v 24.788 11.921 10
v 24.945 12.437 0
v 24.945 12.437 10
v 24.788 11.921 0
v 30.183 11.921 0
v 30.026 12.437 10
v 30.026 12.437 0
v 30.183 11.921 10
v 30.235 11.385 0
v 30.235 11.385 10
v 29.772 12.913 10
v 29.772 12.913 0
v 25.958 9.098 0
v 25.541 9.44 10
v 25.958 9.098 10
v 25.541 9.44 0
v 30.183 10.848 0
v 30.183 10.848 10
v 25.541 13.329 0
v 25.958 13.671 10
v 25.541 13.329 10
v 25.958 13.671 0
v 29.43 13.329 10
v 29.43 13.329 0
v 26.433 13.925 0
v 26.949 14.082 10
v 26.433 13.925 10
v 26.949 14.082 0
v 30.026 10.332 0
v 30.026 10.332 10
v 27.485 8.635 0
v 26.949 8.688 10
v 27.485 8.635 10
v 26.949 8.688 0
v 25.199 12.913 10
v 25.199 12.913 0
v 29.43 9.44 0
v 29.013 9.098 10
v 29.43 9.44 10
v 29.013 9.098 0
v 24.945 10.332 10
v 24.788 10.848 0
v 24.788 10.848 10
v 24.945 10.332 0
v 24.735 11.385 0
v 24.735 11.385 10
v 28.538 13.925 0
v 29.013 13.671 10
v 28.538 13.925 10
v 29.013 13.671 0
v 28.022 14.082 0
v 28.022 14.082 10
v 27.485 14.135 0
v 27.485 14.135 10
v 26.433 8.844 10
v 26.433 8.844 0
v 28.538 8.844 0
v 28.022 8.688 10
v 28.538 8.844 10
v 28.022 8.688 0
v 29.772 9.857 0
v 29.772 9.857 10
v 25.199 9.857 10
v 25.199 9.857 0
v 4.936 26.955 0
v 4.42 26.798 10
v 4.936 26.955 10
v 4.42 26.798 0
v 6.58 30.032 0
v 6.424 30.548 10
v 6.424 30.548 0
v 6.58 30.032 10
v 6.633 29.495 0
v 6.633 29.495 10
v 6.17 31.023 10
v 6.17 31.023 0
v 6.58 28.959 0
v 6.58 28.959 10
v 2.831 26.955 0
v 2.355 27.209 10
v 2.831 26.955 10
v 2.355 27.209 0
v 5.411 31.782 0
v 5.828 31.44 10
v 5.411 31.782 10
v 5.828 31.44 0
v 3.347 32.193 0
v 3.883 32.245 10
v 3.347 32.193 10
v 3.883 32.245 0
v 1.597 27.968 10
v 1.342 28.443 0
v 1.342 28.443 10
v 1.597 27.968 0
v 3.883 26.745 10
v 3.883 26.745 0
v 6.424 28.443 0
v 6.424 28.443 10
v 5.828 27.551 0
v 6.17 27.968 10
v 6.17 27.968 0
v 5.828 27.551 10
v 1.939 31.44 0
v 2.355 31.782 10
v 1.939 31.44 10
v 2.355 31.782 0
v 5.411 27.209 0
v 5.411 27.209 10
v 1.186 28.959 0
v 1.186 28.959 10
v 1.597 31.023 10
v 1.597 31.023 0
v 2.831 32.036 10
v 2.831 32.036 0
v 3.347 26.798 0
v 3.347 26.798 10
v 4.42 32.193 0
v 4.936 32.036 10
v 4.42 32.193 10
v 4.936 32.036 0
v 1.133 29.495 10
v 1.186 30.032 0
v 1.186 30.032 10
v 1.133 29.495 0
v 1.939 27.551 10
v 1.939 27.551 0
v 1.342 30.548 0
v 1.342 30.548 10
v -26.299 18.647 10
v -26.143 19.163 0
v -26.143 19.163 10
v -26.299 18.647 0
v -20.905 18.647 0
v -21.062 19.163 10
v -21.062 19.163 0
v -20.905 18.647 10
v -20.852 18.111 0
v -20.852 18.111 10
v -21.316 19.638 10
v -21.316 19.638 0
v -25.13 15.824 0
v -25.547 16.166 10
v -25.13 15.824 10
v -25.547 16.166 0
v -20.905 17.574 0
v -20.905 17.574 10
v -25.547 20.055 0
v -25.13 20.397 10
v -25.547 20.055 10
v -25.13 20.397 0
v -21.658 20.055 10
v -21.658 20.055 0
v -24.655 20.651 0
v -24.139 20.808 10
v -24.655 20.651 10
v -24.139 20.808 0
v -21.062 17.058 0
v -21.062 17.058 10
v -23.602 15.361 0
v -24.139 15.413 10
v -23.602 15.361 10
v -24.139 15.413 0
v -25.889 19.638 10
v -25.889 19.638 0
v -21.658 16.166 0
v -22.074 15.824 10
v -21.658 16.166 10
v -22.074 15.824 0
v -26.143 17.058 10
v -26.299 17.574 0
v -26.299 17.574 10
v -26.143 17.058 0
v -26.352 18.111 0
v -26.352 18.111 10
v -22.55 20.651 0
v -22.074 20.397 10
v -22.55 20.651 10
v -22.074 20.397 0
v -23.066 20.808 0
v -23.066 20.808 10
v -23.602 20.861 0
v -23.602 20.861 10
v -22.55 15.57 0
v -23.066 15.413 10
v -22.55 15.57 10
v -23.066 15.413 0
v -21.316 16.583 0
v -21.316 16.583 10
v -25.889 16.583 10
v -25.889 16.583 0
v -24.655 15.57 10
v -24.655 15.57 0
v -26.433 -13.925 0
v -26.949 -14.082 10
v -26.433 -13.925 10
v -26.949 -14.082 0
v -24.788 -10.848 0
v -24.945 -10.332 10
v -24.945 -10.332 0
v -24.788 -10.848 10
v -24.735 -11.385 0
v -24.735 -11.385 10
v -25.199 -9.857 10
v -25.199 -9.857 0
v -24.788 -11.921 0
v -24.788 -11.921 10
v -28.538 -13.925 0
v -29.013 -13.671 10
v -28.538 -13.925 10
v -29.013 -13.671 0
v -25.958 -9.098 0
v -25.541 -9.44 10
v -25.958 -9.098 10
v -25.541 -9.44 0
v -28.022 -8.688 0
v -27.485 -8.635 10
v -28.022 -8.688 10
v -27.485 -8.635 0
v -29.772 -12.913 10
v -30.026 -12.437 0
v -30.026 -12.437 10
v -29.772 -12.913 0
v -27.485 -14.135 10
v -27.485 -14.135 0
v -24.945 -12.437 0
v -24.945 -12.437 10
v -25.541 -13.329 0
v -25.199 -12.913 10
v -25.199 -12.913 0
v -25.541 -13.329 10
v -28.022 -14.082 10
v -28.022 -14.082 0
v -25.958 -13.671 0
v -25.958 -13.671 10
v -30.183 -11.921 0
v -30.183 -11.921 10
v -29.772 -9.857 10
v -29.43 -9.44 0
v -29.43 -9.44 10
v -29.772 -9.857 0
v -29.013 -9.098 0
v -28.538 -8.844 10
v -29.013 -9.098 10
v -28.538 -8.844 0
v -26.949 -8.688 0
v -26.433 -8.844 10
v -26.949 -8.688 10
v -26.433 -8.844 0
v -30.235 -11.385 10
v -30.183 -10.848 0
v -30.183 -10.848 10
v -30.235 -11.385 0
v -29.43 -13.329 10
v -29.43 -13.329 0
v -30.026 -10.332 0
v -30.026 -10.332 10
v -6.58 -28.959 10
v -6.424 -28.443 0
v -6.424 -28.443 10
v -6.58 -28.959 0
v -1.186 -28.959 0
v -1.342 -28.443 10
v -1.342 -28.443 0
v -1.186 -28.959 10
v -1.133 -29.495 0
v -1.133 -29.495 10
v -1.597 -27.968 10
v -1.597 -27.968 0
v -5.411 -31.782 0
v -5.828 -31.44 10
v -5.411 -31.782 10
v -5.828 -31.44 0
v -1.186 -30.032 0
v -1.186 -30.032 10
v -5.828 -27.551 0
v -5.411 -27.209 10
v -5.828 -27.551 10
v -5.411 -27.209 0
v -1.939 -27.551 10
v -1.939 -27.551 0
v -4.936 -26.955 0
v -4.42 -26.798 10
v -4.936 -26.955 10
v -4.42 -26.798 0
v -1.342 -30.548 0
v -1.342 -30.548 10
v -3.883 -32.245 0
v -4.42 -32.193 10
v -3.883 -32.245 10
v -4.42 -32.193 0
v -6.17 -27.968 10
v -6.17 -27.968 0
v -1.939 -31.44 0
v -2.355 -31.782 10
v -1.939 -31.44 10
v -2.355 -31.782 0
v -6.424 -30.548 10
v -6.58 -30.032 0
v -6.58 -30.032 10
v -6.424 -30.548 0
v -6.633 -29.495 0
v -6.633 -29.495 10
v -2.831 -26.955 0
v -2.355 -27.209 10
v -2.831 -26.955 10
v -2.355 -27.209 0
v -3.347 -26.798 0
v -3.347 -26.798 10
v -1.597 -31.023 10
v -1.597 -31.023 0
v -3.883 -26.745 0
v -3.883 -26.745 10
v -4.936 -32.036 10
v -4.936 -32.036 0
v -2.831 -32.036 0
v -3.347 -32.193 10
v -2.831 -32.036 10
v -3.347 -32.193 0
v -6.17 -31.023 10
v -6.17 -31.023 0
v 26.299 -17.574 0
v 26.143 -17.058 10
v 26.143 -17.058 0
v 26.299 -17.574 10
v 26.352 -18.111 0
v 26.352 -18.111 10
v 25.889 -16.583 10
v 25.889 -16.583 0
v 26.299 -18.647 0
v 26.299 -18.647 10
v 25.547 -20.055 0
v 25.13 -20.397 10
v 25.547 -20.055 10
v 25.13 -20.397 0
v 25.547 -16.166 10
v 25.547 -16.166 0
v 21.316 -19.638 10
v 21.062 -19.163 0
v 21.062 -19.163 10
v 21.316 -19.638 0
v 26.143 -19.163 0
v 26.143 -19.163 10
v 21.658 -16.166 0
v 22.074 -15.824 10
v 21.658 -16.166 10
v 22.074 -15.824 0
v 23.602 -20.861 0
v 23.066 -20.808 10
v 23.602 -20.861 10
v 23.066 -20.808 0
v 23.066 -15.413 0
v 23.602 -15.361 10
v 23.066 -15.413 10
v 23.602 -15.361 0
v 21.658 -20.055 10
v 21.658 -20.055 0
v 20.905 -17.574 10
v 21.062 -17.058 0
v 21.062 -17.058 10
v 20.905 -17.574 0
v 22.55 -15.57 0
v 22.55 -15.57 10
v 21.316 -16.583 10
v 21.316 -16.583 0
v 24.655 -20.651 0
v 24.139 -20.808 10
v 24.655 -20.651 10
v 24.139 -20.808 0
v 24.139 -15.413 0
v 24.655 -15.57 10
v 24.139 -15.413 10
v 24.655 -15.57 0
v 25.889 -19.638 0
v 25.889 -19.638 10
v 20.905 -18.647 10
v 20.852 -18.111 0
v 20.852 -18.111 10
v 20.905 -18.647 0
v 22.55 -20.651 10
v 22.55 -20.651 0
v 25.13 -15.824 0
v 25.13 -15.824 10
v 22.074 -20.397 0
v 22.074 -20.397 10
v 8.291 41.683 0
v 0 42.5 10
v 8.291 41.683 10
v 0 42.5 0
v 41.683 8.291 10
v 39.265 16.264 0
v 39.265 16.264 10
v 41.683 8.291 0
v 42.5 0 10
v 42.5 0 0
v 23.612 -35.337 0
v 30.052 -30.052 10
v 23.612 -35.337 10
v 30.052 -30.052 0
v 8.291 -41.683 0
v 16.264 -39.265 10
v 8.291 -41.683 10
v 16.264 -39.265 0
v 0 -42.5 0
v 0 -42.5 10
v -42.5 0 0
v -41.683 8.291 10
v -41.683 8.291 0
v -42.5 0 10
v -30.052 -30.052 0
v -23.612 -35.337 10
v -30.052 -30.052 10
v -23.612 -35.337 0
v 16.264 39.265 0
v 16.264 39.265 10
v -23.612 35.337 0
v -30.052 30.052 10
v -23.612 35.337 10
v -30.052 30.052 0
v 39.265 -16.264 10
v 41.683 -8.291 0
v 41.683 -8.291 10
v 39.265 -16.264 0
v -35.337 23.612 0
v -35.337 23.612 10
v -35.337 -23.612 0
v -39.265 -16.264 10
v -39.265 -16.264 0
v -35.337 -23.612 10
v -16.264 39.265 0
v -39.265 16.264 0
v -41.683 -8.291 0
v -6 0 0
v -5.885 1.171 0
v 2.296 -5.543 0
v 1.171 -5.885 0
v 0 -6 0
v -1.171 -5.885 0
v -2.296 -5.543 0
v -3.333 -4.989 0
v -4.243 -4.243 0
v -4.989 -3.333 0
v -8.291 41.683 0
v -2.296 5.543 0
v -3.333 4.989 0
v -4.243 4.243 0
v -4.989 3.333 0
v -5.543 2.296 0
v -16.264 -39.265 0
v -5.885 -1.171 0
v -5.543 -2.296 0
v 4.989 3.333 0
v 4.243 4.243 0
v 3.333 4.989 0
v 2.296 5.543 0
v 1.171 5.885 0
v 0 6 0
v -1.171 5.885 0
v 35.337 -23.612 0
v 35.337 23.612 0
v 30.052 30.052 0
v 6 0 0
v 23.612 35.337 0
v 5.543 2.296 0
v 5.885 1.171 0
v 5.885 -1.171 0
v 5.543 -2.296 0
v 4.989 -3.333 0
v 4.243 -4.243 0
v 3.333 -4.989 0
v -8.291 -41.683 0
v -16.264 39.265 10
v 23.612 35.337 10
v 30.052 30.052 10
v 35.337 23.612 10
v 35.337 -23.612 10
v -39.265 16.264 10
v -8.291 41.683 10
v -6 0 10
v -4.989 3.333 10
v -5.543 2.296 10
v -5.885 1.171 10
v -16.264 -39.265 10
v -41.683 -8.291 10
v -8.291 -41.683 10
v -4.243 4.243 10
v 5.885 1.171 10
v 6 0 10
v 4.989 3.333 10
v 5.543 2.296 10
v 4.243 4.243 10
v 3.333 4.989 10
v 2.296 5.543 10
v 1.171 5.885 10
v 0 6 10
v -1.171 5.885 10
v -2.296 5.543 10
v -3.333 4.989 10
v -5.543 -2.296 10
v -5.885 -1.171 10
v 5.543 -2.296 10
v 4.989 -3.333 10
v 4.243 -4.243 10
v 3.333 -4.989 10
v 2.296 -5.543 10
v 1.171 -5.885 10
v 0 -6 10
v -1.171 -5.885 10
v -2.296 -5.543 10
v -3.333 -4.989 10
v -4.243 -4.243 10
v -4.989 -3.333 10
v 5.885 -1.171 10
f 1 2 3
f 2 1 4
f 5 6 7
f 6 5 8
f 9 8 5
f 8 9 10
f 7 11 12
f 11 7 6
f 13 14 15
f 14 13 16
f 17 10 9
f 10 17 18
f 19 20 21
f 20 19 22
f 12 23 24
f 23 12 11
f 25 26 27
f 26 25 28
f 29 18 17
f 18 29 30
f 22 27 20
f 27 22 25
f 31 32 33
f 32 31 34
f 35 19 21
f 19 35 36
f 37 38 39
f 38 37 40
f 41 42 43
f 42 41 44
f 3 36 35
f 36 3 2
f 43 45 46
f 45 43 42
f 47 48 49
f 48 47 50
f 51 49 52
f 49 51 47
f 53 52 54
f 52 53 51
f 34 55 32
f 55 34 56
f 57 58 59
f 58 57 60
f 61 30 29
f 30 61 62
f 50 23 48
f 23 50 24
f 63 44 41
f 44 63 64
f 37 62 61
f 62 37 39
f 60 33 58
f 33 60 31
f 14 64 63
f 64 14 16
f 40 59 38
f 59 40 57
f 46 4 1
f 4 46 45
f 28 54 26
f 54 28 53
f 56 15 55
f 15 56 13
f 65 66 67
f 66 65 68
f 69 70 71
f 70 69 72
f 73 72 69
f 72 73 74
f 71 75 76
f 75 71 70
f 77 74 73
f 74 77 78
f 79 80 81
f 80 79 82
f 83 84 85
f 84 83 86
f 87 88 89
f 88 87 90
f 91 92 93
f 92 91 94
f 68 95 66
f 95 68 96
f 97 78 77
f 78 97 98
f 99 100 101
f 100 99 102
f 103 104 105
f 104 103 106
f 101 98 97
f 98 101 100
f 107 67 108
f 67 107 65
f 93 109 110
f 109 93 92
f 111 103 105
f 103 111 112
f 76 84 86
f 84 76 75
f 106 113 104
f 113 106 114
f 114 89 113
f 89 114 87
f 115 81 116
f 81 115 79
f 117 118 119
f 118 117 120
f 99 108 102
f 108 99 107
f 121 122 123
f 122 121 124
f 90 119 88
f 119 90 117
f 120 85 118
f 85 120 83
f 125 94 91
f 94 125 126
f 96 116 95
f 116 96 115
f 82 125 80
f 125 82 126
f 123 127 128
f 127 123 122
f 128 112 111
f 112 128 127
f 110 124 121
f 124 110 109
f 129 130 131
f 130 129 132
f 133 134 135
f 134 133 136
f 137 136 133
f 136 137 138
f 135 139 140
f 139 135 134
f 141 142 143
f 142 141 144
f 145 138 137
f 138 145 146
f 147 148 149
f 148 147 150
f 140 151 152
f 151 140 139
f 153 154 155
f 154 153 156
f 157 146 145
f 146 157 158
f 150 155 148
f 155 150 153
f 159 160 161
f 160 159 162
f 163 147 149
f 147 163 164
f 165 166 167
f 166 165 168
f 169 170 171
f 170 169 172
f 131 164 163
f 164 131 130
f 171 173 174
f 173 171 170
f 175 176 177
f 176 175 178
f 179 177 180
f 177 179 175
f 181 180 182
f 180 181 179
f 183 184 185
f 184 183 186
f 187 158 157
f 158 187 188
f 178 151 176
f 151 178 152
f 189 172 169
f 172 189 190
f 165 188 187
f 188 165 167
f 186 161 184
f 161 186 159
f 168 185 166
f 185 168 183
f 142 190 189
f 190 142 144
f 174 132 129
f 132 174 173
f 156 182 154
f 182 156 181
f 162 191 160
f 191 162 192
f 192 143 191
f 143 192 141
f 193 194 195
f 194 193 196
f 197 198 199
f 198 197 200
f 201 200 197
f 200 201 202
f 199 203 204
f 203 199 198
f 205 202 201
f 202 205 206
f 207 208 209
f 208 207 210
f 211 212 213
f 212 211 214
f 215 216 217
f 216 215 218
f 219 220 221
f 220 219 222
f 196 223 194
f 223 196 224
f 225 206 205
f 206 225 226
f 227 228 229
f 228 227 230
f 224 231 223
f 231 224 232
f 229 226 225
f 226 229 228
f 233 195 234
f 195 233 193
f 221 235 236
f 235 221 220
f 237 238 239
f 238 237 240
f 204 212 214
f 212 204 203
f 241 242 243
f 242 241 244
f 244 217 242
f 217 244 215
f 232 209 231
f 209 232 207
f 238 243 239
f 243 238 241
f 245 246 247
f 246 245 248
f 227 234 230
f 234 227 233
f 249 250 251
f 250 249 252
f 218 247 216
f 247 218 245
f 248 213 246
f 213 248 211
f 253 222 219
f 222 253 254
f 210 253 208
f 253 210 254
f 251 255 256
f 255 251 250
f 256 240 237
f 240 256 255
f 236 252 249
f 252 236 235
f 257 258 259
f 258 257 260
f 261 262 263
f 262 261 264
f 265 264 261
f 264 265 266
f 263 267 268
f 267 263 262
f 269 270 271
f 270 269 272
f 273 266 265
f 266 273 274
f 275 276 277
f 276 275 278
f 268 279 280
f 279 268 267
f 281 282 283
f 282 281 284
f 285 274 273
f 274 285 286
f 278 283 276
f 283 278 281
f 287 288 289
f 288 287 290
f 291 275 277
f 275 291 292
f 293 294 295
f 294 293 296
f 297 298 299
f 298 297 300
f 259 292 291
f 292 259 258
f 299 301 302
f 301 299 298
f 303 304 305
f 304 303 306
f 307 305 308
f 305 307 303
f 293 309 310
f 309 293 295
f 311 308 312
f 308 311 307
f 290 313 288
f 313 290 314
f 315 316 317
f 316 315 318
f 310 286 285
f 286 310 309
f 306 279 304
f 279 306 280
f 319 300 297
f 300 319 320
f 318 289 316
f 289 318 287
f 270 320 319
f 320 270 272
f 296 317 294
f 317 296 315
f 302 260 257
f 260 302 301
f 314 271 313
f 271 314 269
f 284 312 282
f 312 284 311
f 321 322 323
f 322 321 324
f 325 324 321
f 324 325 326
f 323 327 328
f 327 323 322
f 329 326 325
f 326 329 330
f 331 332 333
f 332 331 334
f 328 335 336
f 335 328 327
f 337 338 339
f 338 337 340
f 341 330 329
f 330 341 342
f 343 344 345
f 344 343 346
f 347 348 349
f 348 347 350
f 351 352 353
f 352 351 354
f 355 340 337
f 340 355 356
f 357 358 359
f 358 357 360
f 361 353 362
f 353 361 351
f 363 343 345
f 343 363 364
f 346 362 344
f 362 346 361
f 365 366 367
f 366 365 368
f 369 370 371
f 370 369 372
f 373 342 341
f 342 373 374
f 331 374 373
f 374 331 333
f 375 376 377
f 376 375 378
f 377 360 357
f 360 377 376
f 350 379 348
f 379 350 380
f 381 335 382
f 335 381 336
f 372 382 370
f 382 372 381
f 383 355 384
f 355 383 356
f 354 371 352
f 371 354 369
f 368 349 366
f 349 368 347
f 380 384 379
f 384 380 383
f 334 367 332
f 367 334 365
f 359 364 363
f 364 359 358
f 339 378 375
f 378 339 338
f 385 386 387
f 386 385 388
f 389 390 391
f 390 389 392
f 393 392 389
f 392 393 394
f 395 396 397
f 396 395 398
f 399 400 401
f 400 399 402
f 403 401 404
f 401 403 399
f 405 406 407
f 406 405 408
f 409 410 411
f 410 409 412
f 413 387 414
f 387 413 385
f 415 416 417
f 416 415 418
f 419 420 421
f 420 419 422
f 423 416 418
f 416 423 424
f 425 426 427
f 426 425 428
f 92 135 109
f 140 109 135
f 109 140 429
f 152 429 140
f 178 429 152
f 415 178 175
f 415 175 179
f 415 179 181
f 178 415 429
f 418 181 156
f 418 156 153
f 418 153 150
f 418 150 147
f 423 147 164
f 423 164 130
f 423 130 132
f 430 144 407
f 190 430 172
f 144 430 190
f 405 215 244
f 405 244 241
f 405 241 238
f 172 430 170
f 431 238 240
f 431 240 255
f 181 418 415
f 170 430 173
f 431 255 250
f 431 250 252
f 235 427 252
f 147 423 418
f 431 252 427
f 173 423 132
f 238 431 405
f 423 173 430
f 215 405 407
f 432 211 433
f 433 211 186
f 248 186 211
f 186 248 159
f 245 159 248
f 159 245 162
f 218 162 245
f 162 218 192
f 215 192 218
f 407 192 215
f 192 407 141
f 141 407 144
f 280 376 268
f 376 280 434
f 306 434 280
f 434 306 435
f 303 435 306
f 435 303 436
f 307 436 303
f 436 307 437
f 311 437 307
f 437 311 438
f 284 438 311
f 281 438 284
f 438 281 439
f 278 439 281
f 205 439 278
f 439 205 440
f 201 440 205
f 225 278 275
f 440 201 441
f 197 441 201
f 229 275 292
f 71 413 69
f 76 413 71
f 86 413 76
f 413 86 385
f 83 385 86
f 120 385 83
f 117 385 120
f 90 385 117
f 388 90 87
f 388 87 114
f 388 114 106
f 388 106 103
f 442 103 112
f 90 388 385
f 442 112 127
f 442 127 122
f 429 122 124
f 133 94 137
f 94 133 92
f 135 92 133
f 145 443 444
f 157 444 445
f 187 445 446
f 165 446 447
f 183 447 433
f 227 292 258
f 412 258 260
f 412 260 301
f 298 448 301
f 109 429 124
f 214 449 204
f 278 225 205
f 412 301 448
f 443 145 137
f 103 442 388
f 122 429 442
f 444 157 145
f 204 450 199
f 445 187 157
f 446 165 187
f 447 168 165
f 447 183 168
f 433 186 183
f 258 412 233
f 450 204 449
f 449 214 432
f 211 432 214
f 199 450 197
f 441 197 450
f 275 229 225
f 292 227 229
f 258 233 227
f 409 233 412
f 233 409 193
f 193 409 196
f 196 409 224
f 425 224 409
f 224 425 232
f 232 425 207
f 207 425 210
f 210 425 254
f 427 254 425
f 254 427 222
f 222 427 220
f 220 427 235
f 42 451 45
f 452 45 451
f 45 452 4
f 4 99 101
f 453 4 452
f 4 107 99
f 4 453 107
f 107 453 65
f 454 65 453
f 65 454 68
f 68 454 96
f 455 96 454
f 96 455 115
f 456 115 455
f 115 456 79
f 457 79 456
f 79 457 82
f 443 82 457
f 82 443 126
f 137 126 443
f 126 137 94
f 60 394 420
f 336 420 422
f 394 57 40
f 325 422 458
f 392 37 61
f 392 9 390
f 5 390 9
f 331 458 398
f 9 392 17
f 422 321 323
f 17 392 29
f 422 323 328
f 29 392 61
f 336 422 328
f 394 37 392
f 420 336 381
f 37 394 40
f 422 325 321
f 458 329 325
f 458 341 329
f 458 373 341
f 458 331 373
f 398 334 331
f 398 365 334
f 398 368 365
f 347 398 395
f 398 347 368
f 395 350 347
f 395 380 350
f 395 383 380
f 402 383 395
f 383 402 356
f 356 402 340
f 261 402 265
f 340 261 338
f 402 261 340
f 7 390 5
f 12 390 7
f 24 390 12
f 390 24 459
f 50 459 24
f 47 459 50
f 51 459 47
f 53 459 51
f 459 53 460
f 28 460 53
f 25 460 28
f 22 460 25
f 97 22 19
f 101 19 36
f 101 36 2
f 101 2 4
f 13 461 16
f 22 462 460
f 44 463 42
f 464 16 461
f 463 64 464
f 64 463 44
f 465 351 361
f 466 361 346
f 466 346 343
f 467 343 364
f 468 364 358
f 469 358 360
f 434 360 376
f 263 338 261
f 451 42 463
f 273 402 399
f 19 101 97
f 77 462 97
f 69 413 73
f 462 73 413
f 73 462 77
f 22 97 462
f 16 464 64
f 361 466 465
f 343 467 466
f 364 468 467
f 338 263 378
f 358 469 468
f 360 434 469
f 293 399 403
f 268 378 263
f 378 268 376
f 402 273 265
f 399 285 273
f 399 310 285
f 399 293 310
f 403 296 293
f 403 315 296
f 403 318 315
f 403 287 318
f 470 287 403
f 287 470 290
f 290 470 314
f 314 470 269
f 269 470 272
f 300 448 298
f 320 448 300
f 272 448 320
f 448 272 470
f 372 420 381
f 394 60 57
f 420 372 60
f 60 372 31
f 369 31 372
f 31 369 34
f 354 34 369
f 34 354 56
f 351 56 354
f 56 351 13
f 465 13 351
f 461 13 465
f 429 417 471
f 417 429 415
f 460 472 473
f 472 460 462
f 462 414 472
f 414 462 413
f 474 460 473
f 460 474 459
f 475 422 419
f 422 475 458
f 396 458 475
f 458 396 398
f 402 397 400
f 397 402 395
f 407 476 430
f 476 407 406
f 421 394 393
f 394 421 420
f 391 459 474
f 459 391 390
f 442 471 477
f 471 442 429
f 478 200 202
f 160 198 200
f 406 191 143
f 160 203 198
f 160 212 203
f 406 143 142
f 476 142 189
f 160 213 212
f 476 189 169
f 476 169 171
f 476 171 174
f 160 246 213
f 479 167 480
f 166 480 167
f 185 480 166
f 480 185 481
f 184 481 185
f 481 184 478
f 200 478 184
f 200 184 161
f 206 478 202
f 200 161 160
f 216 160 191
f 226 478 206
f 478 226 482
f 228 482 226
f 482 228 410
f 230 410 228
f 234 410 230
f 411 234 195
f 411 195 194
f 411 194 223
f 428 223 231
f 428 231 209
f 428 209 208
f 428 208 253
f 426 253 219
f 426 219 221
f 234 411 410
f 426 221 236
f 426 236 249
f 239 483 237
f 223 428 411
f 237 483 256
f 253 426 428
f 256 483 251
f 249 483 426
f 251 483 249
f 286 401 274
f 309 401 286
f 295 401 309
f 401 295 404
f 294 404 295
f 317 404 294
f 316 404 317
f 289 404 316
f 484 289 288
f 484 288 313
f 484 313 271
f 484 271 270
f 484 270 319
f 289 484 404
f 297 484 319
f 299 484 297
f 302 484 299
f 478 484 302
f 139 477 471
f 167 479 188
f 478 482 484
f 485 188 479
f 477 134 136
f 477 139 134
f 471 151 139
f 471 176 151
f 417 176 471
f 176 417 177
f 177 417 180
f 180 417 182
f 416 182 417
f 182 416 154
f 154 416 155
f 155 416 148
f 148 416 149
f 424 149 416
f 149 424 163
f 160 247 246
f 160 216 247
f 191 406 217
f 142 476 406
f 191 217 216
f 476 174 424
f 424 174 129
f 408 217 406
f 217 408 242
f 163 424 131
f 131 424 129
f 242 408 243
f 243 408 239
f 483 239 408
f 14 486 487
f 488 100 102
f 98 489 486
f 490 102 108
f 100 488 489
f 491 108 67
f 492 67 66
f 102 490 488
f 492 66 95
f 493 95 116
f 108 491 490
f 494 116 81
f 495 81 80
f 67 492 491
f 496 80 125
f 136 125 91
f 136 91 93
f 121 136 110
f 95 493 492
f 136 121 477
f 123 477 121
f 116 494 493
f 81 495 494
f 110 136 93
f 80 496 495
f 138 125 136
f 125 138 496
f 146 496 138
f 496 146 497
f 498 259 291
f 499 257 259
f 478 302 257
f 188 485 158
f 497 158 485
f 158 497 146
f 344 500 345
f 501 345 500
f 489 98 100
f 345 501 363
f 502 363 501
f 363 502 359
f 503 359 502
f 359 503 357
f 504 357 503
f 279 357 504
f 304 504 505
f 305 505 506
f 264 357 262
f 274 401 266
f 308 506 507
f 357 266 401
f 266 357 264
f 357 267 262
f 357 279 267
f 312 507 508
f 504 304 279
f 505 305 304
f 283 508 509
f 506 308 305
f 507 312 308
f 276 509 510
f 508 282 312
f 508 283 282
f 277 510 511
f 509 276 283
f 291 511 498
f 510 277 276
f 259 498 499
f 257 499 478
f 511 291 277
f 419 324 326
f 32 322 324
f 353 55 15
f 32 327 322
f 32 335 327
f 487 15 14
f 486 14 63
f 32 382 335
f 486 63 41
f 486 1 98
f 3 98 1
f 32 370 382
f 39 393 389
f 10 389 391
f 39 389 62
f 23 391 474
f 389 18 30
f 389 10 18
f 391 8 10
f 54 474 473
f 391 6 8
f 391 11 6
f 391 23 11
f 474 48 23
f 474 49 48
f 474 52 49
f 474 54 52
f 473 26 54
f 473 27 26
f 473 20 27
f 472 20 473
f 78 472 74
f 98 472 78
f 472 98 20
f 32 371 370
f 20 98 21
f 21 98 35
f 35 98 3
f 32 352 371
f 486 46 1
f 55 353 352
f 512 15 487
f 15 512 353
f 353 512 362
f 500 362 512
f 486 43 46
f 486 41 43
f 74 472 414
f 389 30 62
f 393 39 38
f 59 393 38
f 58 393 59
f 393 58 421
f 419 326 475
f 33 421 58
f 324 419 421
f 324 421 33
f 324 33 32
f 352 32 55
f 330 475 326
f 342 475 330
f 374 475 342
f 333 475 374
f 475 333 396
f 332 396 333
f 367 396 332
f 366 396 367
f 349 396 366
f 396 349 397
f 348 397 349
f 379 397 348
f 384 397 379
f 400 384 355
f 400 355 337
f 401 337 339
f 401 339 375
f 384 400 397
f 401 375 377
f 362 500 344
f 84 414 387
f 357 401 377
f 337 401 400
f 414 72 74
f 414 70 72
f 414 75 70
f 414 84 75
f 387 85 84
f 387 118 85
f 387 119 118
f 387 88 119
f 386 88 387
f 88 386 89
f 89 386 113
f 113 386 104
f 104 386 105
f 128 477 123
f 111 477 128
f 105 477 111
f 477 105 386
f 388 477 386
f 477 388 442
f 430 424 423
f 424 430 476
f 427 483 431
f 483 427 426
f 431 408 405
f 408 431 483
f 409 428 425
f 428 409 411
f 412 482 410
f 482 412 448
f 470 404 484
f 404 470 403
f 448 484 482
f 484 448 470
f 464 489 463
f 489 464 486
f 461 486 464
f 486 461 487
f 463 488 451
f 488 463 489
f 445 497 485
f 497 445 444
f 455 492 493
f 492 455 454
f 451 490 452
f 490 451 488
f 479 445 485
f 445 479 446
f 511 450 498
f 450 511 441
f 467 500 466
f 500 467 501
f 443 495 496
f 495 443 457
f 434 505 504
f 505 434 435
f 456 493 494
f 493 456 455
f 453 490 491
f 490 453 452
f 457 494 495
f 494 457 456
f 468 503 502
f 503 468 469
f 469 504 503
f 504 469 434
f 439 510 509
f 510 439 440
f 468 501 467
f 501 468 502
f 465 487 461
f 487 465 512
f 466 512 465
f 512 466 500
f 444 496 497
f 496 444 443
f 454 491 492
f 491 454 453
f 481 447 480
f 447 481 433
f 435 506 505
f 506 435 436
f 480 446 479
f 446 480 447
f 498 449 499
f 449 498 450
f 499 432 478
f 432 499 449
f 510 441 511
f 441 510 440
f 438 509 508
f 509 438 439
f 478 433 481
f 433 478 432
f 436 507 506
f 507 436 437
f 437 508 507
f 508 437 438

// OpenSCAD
$fn = 32;

// ----------------------------------------------------------------------
// Flange Ø85 x 10
// 6 holes on a Ø59.5 bolt circle, bolted joints
// ----------------------------------------------------------------------

// --- parameters (mm) ---
flange_d = 85;     // outside diameter of the flange
thickness = 10;    // flange thickness
holes = 6;         // number of bolt holes
pcd = 59.5;        // bolt circle diameter
start_deg = 22.5;  // angle of the first hole, from +X
hole_d = 5.5;      // bolt hole diameter
bore_d = 12;       // central through bore
hub_d = 24;        // hub outside diameter
hub_h = 0;         // hub height above the flange face (0 = no hub)

// --- derived feature positions (mm) ---
height = thickness + hub_h;  // = 10   overall height of the part
pcd_r = pcd / 2;             // = 29.75   bolt circle radius
hole_step = 360 / holes;     // = 60   angular pitch
feature_centers = [
  [pcd_r * cos(start_deg + 0 * hole_step), pcd_r * sin(start_deg + 0 * hole_step)],
  [pcd_r * cos(start_deg + 1 * hole_step), pcd_r * sin(start_deg + 1 * hole_step)],
  [pcd_r * cos(start_deg + 2 * hole_step), pcd_r * sin(start_deg + 2 * hole_step)],
  [pcd_r * cos(start_deg + 3 * hole_step), pcd_r * sin(start_deg + 3 * hole_step)],
  [pcd_r * cos(start_deg + 4 * hole_step), pcd_r * sin(start_deg + 4 * hole_step)],
  [pcd_r * cos(start_deg + 5 * hole_step), pcd_r * sin(start_deg + 5 * hole_step)]
];   // bolt hole centres on the pitch circle

// flange disc, every hole and the bore cut straight through
difference() {
  union() {
    cylinder(d = flange_d, h = thickness);
  }
  translate([0, 0, -1]) cylinder(d = bore_d, h = height + 2);  // bore, through
  for (centre = feature_centers)
    translate([centre[0], centre[1], -1]) cylinder(d = hole_d, h = thickness + 2);
}
